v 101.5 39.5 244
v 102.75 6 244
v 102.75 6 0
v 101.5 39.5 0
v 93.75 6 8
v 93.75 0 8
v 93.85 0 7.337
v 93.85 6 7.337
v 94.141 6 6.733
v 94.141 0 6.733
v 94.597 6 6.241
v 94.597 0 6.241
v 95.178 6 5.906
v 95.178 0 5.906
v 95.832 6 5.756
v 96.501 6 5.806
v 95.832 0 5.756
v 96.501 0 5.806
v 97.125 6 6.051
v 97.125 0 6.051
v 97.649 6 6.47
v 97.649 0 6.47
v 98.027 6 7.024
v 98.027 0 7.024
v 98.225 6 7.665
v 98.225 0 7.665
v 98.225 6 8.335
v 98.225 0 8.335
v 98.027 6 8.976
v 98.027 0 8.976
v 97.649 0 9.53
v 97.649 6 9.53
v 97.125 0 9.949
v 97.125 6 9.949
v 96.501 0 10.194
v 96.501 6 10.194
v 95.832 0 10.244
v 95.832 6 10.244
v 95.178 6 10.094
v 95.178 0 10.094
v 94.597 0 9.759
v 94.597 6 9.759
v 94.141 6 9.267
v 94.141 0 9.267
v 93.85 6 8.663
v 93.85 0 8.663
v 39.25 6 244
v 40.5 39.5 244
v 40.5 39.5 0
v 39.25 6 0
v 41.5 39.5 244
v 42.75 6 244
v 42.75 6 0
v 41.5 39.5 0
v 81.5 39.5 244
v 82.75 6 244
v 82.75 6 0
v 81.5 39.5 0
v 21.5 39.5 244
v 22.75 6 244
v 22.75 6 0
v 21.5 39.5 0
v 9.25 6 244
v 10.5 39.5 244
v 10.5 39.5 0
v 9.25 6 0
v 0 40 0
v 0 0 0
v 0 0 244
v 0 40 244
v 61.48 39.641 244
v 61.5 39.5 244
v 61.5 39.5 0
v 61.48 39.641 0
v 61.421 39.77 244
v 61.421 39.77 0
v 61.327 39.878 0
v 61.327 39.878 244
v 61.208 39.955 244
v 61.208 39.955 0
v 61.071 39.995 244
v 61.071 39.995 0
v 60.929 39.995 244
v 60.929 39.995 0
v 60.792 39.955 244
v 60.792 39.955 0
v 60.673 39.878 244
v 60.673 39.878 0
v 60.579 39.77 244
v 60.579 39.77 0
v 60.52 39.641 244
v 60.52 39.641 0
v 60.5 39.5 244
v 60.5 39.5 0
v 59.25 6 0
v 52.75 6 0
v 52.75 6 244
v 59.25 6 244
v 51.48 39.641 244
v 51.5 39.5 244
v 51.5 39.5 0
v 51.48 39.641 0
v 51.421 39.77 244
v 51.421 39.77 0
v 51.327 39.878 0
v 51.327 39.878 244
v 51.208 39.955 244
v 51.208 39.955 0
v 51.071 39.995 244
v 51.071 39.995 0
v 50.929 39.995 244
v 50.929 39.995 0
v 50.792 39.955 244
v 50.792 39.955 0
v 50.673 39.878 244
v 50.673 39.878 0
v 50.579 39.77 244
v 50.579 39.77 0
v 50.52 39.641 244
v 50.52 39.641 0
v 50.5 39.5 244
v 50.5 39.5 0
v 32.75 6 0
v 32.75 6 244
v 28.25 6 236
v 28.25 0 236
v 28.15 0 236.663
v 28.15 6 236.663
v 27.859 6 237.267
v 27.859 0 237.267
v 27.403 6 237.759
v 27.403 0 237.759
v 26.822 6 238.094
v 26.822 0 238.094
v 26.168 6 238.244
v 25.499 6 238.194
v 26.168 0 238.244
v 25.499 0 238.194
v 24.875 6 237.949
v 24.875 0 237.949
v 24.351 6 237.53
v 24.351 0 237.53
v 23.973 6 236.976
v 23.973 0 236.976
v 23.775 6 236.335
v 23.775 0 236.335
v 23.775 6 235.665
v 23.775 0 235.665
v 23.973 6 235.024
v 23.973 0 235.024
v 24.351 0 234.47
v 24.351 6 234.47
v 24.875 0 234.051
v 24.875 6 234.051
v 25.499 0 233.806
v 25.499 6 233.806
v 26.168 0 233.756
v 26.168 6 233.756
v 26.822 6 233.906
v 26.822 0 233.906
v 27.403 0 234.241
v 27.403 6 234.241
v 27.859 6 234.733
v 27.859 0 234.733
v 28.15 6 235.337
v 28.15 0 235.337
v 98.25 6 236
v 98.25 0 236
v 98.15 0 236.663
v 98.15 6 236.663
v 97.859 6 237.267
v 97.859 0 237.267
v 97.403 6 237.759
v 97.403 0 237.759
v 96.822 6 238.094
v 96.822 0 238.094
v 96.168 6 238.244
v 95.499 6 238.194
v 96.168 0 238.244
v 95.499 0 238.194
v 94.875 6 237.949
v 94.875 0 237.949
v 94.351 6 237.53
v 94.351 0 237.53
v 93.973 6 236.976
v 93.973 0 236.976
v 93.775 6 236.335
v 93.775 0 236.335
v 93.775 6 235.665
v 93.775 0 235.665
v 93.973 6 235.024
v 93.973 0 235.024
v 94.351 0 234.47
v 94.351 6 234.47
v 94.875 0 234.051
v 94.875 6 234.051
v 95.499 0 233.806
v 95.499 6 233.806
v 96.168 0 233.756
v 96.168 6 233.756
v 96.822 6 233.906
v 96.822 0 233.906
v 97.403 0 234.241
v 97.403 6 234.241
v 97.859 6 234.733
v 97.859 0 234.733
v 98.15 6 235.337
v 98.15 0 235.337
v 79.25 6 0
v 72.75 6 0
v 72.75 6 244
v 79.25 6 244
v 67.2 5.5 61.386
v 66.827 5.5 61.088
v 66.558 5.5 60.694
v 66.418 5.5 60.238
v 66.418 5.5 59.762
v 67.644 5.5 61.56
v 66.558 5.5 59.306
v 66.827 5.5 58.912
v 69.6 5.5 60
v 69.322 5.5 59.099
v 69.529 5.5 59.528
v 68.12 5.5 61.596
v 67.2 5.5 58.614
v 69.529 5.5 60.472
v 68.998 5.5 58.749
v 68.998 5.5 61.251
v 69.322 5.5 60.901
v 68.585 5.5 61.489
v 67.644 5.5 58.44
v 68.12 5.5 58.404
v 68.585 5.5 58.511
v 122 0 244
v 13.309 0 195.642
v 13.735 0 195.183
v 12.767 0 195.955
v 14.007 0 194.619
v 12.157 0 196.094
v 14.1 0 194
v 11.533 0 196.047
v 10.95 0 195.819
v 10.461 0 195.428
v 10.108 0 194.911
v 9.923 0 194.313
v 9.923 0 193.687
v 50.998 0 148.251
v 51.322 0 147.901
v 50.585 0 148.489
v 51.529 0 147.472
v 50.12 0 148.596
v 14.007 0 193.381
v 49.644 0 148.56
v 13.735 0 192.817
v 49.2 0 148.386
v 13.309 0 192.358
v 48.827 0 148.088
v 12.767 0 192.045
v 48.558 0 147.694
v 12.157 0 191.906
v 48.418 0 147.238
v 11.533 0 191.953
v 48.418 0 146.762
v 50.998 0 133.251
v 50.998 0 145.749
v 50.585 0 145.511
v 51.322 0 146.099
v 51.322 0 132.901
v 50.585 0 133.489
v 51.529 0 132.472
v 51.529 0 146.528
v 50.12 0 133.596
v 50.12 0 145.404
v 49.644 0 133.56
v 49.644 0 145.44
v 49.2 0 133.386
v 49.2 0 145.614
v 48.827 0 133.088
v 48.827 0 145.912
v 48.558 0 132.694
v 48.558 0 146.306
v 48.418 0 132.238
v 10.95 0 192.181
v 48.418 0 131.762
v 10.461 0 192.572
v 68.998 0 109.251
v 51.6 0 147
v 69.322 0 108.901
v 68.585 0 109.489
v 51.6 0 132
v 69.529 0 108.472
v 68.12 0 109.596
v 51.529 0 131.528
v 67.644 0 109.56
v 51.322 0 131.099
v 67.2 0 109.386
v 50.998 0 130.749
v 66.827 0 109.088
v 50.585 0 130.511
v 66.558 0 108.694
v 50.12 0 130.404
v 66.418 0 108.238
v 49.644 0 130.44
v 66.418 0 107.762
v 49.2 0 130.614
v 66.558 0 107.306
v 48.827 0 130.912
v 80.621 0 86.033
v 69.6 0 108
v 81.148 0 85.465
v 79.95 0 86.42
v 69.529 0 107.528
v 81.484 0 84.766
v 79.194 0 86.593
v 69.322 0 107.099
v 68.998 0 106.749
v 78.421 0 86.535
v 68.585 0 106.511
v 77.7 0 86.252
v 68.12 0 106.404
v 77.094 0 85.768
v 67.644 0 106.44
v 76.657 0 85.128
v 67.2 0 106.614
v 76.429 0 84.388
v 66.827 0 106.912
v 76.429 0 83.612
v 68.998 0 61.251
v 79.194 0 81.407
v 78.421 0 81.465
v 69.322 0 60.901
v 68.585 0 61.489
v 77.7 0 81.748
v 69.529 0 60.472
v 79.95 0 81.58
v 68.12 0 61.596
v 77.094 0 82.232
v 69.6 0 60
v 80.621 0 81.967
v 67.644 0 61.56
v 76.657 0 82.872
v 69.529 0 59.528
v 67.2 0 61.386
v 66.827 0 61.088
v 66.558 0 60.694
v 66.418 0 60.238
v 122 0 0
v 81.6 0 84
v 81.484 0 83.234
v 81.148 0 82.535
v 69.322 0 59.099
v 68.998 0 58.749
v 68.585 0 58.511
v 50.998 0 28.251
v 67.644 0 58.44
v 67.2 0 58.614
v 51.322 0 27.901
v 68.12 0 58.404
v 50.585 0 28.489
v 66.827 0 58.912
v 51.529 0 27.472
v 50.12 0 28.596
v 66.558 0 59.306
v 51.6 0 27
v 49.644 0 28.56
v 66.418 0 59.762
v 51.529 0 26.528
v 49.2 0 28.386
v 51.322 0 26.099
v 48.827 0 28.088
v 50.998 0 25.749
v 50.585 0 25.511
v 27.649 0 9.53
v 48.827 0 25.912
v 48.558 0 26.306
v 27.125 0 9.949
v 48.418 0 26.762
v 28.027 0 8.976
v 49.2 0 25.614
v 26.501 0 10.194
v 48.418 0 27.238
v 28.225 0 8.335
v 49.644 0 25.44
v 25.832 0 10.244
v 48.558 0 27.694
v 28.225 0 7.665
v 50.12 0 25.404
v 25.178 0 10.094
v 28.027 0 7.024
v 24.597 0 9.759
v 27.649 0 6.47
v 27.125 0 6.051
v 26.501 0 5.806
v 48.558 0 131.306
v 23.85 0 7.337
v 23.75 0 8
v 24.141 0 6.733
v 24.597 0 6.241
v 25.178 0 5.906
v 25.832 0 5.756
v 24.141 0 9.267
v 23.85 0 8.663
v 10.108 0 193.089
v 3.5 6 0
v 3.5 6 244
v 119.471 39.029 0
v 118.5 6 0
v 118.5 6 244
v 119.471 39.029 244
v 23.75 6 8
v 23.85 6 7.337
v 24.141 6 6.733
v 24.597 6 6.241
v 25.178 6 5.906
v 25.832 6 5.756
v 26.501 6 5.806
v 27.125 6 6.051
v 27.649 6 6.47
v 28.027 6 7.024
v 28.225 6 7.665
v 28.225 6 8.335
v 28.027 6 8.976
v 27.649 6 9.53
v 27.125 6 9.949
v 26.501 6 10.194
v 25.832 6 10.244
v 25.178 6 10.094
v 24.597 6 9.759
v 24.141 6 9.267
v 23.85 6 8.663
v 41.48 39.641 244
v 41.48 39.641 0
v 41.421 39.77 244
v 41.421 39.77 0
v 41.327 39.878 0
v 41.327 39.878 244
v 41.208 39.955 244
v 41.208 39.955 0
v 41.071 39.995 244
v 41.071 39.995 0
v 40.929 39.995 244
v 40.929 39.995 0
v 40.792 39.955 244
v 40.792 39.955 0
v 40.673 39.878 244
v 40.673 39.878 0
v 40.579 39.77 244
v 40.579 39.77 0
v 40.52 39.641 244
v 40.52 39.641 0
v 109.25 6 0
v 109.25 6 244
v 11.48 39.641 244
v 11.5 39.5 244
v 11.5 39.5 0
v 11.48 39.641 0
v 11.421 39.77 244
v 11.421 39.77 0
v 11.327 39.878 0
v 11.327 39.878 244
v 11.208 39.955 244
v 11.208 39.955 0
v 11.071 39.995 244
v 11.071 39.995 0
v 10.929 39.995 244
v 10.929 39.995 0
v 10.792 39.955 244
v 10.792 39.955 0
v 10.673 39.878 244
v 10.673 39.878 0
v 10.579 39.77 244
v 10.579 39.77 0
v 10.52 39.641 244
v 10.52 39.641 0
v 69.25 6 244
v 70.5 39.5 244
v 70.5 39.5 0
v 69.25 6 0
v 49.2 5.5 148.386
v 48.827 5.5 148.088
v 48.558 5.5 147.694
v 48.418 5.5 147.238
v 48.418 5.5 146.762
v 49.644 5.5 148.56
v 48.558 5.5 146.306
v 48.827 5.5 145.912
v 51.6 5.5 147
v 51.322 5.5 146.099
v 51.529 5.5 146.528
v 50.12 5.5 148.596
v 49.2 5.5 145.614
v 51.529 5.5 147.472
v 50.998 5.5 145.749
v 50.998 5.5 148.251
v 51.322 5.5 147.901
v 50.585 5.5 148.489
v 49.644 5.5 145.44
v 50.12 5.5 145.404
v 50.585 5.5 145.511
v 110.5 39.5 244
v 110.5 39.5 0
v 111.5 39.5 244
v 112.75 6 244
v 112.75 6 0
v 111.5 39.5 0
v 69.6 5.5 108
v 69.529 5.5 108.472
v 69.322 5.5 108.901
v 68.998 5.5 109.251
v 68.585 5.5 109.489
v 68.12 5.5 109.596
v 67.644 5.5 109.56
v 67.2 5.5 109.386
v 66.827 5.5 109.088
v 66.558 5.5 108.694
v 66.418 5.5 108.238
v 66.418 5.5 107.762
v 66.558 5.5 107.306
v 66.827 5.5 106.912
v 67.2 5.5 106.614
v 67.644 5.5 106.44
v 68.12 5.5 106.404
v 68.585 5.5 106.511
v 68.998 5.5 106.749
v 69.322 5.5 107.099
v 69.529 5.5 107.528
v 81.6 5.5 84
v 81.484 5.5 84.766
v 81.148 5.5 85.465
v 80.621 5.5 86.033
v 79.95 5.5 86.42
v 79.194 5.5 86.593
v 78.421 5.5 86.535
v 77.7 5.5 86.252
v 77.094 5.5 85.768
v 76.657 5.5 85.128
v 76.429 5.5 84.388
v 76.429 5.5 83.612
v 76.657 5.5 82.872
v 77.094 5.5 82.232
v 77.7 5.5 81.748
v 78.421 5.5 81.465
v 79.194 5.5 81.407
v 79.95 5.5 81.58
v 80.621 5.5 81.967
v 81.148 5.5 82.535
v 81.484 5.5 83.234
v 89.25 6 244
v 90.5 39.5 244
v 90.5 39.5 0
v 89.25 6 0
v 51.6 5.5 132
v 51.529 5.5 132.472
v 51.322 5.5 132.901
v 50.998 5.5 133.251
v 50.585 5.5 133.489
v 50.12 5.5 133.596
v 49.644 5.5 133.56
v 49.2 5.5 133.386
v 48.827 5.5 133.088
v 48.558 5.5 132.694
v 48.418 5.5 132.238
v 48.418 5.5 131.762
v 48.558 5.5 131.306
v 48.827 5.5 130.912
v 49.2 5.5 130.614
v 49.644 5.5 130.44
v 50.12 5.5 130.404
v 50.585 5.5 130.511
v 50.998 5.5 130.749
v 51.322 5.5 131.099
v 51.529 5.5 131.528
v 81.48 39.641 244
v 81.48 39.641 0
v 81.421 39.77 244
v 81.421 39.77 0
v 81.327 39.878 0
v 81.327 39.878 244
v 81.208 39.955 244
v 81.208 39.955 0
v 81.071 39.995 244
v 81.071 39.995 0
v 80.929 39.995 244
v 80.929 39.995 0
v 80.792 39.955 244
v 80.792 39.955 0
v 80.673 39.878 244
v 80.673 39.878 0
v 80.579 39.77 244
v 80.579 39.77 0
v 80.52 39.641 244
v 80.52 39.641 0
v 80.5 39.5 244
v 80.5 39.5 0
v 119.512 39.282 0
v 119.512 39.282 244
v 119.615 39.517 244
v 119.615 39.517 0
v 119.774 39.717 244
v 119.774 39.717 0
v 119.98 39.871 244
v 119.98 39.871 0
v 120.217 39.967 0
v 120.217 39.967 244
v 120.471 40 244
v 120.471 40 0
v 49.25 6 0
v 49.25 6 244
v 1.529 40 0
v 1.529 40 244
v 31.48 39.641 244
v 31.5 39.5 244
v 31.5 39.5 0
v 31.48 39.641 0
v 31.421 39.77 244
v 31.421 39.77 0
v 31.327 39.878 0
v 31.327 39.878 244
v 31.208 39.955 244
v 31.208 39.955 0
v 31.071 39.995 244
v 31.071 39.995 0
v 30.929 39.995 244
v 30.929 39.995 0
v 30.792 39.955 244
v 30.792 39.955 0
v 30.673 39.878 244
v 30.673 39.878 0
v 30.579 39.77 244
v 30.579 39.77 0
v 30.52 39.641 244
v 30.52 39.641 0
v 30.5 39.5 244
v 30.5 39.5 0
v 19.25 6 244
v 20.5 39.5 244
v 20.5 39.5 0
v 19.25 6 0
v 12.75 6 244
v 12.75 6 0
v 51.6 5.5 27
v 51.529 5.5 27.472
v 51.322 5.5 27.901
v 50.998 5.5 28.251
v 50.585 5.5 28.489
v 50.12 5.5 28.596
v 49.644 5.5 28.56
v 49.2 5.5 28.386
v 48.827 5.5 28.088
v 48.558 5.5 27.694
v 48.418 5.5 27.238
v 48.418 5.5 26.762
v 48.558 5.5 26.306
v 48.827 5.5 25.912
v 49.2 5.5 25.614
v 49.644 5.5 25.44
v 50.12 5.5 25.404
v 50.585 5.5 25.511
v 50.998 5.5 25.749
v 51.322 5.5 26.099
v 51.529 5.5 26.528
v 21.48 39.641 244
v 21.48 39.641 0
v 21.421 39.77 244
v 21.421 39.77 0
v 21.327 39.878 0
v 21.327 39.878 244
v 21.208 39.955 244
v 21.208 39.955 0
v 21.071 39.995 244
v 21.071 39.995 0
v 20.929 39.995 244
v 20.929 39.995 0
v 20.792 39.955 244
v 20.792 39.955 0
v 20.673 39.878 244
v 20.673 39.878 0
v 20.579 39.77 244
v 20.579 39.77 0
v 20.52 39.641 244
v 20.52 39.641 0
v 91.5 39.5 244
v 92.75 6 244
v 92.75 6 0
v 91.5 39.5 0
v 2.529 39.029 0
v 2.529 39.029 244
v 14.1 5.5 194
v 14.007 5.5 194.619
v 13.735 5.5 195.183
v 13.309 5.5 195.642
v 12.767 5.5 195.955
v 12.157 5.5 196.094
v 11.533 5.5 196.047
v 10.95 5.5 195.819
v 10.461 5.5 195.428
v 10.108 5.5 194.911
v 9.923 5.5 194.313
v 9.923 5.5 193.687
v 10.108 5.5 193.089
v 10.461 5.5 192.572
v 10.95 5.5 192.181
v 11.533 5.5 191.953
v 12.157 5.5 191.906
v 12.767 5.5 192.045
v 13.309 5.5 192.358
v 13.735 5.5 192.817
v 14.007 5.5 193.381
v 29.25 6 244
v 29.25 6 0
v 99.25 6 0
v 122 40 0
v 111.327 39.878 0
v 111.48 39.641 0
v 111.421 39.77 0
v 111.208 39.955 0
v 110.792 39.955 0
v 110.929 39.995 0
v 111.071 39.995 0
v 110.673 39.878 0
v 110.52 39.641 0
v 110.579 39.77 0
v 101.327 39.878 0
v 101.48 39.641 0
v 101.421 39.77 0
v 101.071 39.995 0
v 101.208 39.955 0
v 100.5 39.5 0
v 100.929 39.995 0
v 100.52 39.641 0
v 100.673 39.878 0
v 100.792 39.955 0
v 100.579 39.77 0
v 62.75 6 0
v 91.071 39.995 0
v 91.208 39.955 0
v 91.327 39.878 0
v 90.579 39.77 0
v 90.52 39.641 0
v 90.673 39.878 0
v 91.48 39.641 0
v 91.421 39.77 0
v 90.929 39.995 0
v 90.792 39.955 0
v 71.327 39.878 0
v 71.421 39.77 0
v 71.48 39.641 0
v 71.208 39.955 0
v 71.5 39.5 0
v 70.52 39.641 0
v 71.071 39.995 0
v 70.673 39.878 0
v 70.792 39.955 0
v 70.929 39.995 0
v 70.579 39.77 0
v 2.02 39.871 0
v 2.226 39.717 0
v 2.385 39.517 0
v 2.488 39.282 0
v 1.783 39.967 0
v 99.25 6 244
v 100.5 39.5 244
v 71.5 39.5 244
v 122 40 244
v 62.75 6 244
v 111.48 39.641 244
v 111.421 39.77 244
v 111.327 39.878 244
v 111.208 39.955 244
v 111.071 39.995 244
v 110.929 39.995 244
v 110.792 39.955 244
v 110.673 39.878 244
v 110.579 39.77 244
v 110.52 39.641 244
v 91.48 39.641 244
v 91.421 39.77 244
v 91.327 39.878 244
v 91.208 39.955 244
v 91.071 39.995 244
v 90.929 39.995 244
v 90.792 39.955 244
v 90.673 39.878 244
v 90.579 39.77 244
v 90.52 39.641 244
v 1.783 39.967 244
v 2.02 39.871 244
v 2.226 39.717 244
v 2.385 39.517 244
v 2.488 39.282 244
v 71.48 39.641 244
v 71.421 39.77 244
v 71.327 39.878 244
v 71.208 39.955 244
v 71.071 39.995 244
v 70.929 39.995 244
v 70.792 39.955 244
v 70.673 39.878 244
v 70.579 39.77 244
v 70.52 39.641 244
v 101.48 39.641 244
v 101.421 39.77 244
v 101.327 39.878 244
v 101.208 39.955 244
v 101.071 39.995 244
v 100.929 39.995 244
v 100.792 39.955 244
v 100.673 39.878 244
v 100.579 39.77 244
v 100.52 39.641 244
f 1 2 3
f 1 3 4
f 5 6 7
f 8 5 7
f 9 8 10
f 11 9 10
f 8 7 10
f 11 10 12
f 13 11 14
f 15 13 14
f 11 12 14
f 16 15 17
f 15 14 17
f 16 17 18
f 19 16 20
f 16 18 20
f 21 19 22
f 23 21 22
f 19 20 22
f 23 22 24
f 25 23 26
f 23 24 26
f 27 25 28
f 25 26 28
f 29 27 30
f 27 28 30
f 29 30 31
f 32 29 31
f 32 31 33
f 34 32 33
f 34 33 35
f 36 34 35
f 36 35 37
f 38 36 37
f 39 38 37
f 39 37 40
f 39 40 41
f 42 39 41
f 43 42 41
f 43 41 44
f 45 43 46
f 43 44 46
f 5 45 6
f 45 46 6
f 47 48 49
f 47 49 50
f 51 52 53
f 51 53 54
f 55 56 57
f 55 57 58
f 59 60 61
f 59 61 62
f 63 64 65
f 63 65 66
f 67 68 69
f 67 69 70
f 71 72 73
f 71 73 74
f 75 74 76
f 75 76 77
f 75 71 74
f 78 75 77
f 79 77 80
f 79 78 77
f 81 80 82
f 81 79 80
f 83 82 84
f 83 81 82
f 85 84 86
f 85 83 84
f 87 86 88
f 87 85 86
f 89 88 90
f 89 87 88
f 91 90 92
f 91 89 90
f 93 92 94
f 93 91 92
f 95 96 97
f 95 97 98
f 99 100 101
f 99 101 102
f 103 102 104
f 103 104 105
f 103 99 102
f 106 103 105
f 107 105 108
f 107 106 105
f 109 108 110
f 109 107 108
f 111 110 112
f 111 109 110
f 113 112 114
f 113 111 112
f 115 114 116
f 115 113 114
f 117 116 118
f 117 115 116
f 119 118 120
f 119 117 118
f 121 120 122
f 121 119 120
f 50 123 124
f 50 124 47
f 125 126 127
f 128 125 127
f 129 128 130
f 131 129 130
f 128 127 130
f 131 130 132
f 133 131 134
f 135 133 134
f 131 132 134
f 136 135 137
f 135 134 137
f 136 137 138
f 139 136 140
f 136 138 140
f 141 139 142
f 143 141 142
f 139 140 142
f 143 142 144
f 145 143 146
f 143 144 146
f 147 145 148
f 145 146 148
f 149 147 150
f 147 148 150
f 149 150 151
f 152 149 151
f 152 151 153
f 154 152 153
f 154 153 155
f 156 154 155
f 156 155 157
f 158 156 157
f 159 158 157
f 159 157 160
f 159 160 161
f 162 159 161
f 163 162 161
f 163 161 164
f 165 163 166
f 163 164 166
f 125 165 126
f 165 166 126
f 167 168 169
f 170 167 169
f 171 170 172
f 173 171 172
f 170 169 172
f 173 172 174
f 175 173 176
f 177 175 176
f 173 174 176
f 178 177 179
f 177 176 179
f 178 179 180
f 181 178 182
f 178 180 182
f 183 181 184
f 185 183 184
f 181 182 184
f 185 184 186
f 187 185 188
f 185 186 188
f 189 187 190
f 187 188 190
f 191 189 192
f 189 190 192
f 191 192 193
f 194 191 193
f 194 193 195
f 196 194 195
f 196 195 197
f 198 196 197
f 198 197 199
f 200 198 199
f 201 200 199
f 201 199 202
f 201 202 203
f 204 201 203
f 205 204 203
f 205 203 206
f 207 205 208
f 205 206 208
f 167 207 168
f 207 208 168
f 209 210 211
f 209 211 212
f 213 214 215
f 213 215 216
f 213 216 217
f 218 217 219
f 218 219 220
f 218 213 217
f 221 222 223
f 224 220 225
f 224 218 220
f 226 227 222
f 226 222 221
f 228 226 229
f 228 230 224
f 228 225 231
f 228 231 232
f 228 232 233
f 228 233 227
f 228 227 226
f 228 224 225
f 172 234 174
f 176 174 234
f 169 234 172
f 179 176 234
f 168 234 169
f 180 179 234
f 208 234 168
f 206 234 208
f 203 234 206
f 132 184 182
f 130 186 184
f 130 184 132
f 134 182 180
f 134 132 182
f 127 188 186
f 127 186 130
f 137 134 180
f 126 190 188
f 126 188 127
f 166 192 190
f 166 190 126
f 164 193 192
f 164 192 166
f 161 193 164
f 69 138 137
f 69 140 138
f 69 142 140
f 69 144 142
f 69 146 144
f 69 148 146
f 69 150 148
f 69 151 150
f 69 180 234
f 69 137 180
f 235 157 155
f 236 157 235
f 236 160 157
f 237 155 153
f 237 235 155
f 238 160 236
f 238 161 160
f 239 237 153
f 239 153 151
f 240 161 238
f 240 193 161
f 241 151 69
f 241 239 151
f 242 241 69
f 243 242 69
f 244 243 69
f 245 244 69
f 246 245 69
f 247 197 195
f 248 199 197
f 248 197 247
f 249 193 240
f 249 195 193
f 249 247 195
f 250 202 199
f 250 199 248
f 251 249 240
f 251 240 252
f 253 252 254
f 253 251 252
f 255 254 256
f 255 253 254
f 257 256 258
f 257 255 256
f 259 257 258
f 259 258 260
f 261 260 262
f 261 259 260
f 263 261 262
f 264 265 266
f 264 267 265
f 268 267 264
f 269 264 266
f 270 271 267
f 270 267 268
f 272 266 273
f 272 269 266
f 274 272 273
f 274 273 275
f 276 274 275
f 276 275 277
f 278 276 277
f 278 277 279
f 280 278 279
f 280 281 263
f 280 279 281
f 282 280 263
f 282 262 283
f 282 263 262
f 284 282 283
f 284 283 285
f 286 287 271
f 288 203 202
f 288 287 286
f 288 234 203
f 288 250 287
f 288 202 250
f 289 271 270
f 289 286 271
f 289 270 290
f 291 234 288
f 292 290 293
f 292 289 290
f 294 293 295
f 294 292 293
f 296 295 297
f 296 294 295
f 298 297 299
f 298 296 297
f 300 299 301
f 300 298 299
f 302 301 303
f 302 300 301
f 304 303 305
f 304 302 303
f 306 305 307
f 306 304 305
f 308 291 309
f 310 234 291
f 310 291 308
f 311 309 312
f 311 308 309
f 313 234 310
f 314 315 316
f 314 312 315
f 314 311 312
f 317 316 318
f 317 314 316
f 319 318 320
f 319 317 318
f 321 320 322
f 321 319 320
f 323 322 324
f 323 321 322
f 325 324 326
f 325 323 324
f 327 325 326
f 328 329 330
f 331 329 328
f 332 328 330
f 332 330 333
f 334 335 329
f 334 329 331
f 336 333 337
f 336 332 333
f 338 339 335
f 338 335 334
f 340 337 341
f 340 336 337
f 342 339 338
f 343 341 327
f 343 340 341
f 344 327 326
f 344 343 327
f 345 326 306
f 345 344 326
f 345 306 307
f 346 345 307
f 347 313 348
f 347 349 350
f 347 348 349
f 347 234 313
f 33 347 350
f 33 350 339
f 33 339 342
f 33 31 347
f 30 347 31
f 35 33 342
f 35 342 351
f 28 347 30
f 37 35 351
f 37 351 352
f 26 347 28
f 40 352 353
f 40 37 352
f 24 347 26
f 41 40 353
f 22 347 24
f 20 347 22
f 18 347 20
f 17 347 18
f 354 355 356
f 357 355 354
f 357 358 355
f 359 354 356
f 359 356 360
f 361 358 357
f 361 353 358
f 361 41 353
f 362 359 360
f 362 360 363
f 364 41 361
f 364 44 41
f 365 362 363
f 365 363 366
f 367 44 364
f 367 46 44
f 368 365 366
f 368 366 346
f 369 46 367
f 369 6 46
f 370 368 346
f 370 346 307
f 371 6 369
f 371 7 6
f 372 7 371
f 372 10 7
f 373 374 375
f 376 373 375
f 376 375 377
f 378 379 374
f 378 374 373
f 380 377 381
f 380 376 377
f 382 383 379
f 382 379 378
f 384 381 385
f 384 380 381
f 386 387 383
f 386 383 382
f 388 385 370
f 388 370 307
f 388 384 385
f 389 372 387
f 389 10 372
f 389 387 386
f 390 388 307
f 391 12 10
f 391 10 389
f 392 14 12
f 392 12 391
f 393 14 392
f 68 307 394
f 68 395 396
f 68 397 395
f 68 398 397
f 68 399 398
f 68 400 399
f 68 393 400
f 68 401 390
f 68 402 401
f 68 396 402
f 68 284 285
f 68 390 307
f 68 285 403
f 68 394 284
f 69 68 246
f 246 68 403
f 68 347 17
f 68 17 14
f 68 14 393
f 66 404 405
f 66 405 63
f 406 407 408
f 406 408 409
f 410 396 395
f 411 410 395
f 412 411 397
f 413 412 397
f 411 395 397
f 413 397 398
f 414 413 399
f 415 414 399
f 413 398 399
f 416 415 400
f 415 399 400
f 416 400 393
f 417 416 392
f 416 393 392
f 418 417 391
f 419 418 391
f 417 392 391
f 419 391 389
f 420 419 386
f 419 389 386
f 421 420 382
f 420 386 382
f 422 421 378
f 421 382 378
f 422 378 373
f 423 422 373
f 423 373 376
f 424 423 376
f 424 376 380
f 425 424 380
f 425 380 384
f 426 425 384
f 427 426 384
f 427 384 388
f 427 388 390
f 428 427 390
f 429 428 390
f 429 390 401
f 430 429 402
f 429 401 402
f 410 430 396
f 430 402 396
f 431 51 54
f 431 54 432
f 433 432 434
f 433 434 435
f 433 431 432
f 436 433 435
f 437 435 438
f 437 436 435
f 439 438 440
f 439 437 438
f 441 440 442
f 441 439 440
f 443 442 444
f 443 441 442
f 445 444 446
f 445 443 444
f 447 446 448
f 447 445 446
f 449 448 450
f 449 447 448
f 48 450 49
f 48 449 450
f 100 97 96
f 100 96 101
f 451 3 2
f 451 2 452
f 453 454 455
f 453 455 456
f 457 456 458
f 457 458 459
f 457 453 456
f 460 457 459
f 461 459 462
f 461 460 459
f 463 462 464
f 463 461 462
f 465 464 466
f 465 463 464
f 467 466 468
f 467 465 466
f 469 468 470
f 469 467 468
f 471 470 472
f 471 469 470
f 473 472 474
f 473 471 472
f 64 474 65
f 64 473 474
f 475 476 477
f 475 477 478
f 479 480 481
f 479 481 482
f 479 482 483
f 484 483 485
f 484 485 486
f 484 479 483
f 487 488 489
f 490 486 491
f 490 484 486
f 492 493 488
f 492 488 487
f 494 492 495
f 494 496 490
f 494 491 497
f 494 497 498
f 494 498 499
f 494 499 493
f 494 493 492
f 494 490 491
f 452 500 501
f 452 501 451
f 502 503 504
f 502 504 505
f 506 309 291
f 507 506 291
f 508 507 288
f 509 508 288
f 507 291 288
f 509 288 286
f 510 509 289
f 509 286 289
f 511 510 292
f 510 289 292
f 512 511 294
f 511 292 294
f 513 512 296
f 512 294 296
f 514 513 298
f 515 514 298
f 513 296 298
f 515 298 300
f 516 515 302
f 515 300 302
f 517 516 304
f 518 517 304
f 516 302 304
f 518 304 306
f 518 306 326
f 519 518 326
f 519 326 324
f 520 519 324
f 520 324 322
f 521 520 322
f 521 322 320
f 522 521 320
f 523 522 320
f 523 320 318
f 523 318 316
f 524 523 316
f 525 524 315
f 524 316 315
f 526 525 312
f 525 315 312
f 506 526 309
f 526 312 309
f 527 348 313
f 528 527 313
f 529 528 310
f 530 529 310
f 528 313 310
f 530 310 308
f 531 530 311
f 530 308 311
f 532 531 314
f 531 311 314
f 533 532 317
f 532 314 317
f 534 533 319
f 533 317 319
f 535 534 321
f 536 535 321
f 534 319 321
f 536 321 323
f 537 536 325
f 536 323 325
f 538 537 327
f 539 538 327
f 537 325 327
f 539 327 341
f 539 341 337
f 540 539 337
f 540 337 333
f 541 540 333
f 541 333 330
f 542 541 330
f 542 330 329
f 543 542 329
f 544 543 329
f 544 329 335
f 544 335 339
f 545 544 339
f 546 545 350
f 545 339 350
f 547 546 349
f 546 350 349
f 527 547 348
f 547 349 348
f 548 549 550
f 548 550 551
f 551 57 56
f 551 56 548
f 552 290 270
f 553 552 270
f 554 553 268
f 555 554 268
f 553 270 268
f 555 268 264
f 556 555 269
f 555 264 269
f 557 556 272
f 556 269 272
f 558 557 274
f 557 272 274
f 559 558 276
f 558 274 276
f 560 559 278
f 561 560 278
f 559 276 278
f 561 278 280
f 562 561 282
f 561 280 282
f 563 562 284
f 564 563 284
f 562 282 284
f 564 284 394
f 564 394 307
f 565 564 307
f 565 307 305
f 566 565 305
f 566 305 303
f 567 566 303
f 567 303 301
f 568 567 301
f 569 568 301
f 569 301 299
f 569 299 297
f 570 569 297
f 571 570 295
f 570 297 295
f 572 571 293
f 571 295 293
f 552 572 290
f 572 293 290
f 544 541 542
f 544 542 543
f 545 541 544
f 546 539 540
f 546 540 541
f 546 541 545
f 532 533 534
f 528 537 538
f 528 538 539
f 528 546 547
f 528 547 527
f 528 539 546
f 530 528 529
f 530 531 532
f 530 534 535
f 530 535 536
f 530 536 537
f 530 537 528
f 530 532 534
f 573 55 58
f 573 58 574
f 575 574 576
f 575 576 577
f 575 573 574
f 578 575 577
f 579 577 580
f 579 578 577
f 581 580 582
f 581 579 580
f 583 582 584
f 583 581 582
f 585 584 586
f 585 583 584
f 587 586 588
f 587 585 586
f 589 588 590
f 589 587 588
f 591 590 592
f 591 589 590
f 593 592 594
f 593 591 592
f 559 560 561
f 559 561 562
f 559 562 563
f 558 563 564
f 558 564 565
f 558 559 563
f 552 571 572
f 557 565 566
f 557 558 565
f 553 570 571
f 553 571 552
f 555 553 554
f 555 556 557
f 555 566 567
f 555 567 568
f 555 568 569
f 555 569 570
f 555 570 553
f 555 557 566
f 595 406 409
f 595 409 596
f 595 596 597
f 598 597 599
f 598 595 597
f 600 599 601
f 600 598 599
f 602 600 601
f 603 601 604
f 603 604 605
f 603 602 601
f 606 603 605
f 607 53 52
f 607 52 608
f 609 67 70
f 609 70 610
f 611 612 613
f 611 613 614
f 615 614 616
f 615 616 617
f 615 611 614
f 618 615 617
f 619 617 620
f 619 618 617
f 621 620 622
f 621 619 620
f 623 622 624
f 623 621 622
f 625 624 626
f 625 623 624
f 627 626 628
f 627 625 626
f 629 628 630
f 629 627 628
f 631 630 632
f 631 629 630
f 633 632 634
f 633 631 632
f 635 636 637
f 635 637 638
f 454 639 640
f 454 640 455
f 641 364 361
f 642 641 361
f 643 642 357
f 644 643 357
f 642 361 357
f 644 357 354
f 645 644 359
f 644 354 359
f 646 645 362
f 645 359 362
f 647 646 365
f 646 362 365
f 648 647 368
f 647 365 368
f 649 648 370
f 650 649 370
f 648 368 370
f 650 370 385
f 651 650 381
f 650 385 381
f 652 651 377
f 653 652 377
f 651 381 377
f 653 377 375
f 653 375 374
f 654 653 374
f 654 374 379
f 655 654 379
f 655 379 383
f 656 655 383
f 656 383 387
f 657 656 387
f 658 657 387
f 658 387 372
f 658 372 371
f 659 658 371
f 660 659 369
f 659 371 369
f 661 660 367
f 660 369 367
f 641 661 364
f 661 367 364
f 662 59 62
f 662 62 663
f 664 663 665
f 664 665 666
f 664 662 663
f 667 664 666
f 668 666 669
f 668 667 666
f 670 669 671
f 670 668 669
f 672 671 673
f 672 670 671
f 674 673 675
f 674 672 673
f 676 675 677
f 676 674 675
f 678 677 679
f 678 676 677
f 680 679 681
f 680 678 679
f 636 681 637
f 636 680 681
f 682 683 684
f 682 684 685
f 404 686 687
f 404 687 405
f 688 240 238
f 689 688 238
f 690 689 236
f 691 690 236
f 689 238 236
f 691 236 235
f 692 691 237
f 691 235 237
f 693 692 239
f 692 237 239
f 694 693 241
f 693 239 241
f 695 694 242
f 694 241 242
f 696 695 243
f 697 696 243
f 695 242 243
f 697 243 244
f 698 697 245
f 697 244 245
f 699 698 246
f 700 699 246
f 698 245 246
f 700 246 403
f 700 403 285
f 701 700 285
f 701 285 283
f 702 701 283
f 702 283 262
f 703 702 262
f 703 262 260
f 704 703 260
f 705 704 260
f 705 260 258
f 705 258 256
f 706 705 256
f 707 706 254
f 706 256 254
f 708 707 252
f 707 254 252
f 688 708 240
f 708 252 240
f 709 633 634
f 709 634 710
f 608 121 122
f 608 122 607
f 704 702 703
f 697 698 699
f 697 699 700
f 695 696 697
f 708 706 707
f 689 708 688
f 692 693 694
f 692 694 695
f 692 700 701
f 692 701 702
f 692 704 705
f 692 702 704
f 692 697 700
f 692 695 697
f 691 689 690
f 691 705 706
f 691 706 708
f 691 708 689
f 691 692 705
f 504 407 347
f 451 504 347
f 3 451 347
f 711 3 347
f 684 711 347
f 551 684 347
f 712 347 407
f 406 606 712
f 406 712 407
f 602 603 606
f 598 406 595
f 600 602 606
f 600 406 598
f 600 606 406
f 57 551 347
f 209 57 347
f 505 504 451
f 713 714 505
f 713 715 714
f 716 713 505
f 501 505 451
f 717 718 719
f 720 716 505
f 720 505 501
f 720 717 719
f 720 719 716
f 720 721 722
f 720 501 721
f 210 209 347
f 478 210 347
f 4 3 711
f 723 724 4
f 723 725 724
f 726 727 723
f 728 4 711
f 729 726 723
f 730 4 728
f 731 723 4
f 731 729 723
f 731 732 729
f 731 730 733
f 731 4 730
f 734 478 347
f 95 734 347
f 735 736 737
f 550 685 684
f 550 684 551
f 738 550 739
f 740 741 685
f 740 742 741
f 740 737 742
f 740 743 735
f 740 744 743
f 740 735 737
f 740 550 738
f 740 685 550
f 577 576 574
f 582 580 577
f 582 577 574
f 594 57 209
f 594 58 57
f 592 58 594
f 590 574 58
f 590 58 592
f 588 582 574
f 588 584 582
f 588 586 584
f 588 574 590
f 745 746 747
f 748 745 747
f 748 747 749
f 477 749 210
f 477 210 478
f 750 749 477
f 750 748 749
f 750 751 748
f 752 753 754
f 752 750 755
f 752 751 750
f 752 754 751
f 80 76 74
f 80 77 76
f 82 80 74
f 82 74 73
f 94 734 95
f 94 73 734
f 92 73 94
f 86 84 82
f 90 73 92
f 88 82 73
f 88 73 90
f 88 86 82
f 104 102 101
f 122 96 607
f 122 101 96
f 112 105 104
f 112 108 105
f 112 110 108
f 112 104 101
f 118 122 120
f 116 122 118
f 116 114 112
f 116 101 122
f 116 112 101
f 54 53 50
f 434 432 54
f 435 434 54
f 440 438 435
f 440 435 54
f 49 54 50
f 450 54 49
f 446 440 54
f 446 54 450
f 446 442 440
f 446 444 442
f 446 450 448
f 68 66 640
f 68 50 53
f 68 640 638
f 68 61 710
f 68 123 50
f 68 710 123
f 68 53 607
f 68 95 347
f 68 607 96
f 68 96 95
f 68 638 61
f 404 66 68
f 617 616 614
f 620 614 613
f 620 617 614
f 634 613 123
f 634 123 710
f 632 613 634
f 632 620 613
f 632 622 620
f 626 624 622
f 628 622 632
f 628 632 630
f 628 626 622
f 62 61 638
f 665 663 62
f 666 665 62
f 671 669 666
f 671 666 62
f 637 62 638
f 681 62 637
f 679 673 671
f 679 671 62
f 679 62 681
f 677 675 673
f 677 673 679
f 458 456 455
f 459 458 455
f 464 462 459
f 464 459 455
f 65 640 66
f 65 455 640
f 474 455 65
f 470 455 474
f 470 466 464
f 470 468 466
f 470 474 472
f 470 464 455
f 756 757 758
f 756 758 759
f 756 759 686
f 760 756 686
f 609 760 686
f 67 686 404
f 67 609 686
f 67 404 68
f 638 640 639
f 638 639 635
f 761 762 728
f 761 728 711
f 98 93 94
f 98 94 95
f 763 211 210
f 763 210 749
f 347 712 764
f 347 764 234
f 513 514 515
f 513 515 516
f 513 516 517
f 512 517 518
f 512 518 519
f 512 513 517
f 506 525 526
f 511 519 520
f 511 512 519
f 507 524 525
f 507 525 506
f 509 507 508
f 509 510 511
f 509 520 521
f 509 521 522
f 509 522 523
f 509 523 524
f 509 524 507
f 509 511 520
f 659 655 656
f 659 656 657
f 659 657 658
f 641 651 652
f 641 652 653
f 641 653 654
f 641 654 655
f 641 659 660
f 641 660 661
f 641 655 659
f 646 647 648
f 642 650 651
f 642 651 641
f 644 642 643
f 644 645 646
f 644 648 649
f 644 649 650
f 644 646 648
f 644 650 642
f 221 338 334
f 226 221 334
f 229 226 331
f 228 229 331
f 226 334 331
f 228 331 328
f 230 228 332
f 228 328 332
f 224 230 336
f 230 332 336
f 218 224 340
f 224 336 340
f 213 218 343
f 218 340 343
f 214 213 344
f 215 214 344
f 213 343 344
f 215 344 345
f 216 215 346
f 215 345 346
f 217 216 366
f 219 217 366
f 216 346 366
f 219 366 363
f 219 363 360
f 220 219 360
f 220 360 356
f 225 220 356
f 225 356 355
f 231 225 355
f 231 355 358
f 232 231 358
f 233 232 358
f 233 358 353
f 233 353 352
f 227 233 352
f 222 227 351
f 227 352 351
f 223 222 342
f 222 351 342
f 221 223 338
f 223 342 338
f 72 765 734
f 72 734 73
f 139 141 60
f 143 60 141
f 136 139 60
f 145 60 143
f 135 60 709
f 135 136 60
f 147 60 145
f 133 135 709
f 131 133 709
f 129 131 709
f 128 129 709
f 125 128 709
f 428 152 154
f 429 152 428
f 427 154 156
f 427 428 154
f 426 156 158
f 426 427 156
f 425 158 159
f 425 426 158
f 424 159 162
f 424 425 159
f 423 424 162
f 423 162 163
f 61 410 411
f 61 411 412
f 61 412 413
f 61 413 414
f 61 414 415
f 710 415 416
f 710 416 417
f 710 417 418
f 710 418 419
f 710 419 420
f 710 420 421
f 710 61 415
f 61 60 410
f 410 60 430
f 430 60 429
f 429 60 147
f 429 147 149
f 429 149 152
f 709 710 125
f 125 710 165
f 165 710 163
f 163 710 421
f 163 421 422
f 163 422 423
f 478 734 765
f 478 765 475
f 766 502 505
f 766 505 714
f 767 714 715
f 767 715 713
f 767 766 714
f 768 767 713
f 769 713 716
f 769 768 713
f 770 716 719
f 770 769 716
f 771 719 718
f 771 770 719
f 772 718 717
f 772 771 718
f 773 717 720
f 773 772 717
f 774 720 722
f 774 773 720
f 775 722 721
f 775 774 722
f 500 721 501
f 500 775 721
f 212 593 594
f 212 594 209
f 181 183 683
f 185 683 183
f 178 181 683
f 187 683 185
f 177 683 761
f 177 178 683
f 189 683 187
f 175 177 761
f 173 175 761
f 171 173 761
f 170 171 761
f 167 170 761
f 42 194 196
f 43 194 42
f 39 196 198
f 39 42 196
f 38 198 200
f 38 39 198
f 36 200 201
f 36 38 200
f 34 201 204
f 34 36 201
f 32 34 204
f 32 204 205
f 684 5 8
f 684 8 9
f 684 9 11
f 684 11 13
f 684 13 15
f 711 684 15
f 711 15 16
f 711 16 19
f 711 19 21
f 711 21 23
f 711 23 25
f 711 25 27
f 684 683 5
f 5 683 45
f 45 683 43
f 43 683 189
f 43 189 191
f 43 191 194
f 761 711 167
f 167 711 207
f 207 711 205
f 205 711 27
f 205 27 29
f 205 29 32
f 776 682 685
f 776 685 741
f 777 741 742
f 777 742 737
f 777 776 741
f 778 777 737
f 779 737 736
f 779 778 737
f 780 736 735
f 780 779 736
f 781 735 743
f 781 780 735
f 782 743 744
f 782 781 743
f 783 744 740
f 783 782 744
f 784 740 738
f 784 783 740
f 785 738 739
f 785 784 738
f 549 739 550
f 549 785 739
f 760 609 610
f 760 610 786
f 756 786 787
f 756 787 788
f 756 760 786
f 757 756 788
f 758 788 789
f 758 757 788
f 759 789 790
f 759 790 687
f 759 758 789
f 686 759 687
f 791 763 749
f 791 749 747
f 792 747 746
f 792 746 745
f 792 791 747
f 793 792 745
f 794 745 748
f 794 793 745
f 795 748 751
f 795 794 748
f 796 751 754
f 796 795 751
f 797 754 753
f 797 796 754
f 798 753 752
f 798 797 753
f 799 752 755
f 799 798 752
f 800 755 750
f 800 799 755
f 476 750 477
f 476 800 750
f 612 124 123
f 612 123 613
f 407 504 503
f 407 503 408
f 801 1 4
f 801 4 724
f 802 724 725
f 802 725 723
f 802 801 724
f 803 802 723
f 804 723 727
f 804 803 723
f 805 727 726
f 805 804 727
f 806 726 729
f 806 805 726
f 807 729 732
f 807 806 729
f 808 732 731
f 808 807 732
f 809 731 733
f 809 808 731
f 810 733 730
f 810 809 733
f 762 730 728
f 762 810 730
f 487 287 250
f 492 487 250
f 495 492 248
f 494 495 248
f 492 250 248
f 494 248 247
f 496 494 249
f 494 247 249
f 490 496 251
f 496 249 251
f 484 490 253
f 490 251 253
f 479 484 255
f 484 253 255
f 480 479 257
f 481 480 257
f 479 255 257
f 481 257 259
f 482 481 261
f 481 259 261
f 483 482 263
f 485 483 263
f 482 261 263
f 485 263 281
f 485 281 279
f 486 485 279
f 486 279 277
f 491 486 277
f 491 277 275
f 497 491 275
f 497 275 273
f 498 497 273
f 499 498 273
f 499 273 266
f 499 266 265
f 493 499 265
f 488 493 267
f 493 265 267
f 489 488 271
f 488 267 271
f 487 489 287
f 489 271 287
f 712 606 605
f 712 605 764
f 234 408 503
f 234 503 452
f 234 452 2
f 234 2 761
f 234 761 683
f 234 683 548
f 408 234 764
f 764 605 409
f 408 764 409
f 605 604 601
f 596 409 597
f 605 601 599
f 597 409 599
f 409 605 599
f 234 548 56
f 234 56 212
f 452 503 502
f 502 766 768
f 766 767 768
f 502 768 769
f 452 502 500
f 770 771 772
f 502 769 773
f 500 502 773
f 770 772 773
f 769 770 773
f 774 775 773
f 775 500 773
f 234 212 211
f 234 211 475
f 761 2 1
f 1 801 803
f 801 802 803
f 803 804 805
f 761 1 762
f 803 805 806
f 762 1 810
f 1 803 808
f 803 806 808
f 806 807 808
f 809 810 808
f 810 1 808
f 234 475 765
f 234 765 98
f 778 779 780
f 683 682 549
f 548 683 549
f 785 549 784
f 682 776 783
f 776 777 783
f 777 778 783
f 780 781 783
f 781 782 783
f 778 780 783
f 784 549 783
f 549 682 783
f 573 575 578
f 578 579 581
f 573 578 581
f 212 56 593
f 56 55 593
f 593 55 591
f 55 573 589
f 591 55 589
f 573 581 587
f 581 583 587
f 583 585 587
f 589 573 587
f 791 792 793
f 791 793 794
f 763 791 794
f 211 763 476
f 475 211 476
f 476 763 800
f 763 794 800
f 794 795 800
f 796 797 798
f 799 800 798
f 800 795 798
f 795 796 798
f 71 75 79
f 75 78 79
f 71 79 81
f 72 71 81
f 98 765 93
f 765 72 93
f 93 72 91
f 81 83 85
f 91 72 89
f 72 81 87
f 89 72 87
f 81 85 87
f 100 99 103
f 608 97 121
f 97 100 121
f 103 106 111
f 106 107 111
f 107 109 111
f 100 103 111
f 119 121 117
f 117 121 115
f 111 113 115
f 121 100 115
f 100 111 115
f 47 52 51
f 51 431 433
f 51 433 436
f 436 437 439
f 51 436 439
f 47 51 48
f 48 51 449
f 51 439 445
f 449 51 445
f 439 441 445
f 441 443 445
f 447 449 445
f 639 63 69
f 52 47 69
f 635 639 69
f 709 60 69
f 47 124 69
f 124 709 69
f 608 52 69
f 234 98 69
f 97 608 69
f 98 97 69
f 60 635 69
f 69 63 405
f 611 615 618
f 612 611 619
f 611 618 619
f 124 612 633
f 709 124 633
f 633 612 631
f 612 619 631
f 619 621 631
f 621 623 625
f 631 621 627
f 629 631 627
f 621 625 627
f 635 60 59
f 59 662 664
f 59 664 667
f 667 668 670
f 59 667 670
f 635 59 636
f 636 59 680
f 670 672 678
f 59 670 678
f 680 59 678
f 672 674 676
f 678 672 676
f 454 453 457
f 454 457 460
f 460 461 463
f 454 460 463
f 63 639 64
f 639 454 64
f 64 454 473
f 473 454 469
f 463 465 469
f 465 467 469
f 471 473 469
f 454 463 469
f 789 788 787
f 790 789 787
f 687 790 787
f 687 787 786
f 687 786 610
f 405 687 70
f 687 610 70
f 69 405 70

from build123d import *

# Parameters (mm, degrees)
EXTRUDE_1_DEPTH       = 244
EXTRUDE_3_DEPTH       = 244
PATTERN_CURVE_1_COUNT = 11
PATTERN_CURVE_1_PITCH = 10
SKETCH_3_R            = 2.25
CUT_EXTRUDE_1_DEPTH   = 6
SKETCH_4_R            = 1.6
SKETCH_4_R_2          = 2.6
SKETCH_4_R_3          = 2.1
CUT_EXTRUDE_2_DEPTH   = 5.5


with BuildPart() as part:
    # Эскиз1 → Вытянуть1 (new body)
    with BuildSketch(Plane.XY):
        with BuildLine():
            Line((0, 40), (1.528979332, 40))
            ThreePointArc((1.528979332, 40), (2.225614441, 39.717425624), (2.528547087, 39.029399052))
            Line((2.528547087, 39.029399052), (3.5, 6))
            Line((3.5, 6), (118.5, 6))
            Line((118.5, 6), (119.471452913, 39.029399052))
            ThreePointArc((119.471452913, 39.029399052), (119.774385559, 39.717425624), (120.471020668, 40))
            Line((120.471020668, 40), (122, 40))
            Line((122, 40), (122, 0))
            Line((122, 0), (0, 0))
            Line((0, 0), (0, 40))
        make_face()
    extrude(amount=EXTRUDE_1_DEPTH)

    # Эскиз2 → Вытянуть3 (add)
    with BuildSketch(Plane.XY.offset(244)):
        with BuildLine():
            Line((10.5, 39.5), (9.25, 6))
            Line((9.25, 6), (12.75, 6))
            Line((12.75, 6), (11.5, 39.5))
            ThreePointArc((11.5, 39.5), (11, 40), (10.5, 39.5))
        make_face()
    extrude_3 = extrude(amount=-EXTRUDE_3_DEPTH)

    # Кривая1: Вытянуть3 ×11
    with Locations(*[(i * PATTERN_CURVE_1_PITCH, 0, 0) for i in range(1, PATTERN_CURVE_1_COUNT)]):
        add(extrude_3)

    # Эскиз3 → Вырез-Вытянуть1 (cut)
    with BuildSketch(Plane.XZ):
        with Locations((26, 236)):
            Circle(SKETCH_3_R)
        with Locations((96, 236)):
            Circle(SKETCH_3_R)
        with Locations(Location((96, 8, 0), (0, 0, 180))):
            Circle(SKETCH_3_R)
        with Locations(Location((26, 8, 0), (0, 0, 180))):
            Circle(SKETCH_3_R)
    extrude(amount=-CUT_EXTRUDE_1_DEPTH, mode=Mode.SUBTRACT)

    # Эскиз4 → Вырез-Вытянуть2 (cut)
    with BuildSketch(Plane(origin=(-5.723570629, 0, -26.359021189), x_dir=(1, 0, 0), z_dir=(0, -1, 0))):
        with Locations((55.723570629, 158.359021189)):
            Circle(SKETCH_4_R)
        with Locations((55.723570629, 53.359021189)):
            Circle(SKETCH_4_R)
        with Locations((55.723570629, 173.359021189)):
            Circle(SKETCH_4_R)
        with Locations((73.723570629, 86.359021189)):
            Circle(SKETCH_4_R)
        with Locations((73.723570629, 134.359021189)):
            Circle(SKETCH_4_R)
        with Locations((84.723570629, 110.359021189)):
            Circle(SKETCH_4_R_2)
        with Locations((17.723570629, 220.359021189)):
            Circle(SKETCH_4_R_3)
    extrude(amount=-CUT_EXTRUDE_2_DEPTH, mode=Mode.SUBTRACT)


solid = part.part
